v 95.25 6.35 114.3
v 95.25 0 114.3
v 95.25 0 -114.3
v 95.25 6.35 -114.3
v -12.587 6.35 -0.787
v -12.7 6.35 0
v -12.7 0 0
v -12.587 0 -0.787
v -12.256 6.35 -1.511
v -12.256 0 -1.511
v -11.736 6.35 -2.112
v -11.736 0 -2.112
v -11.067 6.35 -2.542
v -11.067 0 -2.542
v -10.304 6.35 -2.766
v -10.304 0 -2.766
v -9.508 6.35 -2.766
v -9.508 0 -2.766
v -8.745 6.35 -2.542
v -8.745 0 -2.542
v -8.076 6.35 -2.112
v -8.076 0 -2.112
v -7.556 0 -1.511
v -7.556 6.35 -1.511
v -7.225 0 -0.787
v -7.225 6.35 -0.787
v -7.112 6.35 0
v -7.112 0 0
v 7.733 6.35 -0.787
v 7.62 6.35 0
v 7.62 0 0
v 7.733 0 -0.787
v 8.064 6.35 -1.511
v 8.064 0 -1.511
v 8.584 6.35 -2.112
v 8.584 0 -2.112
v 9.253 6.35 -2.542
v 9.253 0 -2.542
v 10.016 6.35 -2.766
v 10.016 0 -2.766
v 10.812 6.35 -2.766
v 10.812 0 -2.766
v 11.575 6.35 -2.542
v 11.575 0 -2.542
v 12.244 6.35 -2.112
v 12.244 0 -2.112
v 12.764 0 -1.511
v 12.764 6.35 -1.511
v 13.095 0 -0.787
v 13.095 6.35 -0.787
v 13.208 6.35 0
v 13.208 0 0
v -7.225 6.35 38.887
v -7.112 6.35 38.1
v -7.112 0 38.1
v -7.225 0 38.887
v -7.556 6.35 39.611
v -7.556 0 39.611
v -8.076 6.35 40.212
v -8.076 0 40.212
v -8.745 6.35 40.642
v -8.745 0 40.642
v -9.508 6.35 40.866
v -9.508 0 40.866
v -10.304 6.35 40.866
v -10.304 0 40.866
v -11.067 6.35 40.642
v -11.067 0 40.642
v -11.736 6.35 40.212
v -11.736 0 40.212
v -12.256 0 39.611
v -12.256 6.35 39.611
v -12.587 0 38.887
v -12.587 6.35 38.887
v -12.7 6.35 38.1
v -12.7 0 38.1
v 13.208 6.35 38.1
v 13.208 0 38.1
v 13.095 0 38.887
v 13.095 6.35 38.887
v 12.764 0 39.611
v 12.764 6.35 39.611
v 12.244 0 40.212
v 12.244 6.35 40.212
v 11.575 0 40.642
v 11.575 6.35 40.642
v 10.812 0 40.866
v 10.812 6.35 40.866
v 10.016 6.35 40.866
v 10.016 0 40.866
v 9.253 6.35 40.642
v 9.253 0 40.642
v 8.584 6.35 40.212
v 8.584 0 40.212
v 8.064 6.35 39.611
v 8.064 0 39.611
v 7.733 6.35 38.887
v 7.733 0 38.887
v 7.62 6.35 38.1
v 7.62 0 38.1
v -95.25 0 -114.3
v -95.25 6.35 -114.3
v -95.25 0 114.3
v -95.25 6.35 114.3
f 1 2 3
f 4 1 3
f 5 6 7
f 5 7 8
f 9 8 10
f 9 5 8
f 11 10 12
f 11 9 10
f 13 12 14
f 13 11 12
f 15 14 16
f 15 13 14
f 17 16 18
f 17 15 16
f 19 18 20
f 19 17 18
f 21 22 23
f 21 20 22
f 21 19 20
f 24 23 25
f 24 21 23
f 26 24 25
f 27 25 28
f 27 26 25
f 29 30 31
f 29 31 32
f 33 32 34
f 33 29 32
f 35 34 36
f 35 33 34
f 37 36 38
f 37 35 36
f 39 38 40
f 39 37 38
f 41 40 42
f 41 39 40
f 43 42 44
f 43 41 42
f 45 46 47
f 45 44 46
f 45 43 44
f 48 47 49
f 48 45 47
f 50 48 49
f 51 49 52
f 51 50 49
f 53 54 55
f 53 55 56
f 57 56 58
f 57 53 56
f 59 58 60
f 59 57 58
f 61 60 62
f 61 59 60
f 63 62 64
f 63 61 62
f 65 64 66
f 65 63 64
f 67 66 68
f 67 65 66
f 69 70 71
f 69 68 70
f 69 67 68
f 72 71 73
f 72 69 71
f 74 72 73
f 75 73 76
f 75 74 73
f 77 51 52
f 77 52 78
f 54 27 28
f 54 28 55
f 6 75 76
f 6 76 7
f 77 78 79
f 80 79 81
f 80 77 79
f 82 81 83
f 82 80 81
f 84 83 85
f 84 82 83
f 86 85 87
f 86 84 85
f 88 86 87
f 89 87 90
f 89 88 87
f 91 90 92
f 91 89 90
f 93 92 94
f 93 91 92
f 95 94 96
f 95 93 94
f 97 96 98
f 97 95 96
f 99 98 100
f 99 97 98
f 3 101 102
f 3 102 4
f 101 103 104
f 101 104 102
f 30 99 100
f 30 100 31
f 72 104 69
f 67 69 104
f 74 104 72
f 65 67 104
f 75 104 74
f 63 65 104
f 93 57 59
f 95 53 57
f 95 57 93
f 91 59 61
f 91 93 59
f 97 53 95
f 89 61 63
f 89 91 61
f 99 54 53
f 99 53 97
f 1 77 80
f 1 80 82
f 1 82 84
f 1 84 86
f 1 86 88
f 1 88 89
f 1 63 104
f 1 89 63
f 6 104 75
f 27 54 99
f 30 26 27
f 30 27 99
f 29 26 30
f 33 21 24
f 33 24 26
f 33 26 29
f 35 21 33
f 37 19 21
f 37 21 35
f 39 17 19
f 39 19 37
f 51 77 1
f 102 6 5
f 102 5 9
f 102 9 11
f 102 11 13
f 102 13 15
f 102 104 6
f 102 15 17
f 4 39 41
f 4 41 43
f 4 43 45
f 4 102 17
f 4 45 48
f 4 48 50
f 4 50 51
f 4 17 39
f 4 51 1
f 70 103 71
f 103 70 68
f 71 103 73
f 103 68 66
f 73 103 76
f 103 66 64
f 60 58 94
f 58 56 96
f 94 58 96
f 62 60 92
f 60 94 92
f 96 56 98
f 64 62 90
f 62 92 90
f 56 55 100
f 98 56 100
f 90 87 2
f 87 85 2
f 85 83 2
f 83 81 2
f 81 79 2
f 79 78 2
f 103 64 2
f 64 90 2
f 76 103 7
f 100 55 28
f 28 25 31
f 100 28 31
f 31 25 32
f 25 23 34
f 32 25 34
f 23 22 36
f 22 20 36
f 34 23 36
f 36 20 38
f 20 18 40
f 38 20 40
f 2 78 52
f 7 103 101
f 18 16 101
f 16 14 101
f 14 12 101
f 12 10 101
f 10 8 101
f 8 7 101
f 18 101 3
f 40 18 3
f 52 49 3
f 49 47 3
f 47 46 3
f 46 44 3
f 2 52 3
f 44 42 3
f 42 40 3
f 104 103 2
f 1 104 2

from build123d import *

# Parameters (mm, degrees)
SKETCH1_W           = 190.5
SKETCH1_H           = 228.6
BOSS_EXTRUDE1_DEPTH = 6.35
CUT_EXTRUDE1_REACH  = 8.35


with BuildPart() as part:
    # Sketch1 → Boss-Extrude1 (new body)
    with BuildSketch(Plane(origin=(0, 0, 0), x_dir=(1, 0, 0), z_dir=(0, 1, 0))):
        Rectangle(SKETCH1_W, SKETCH1_H)
    extrude(amount=BOSS_EXTRUDE1_DEPTH)

    # Sketch2 → Cut-Extrude1 (cut, up to next)
    with BuildSketch(Plane(origin=(0, 6.35, 0), x_dir=(1, 0, 0), z_dir=(0, 1, 0)), mode=Mode.PRIVATE) as cut_extrude1_sk1:
        with BuildLine():
            Line((-7.112, 0), (-7.112, -38.1))
            ThreePointArc((-7.112, -38.1), (-9.906, -40.894), (-12.7, -38.1))
            Line((-12.7, -38.1), (-12.7, 0))
            ThreePointArc((-12.7, 0), (-9.906, 2.794), (-7.112, 0))
        make_face()
    cut_extrude1_tool1 = extrude(cut_extrude1_sk1.sketch, amount=-CUT_EXTRUDE1_REACH, mode=Mode.PRIVATE) & part.part
    add(cut_extrude1_tool1.solids().sort_by_distance((-9.906, 6.35, 19.05))[0], mode=Mode.SUBTRACT)
    # Sketch2 → Cut-Extrude1 (cut, up to next)
    with BuildSketch(Plane(origin=(0, 6.35, 0), x_dir=(1, 0, 0), z_dir=(0, 1, 0)), mode=Mode.PRIVATE) as cut_extrude1_sk2:
        with BuildLine():
            Line((13.208, 0), (13.208, -38.1))
            ThreePointArc((13.208, -38.1), (10.414, -40.894), (7.62, -38.1))
            Line((7.62, -38.1), (7.62, 0))
            ThreePointArc((7.62, 0), (10.414, 2.794), (13.208, 0))
        make_face()
    cut_extrude1_tool2 = extrude(cut_extrude1_sk2.sketch, amount=-CUT_EXTRUDE1_REACH, mode=Mode.PRIVATE) & part.part
    add(cut_extrude1_tool2.solids().sort_by_distance((10.414, 6.35, 19.05))[0], mode=Mode.SUBTRACT)


solid = part.part
